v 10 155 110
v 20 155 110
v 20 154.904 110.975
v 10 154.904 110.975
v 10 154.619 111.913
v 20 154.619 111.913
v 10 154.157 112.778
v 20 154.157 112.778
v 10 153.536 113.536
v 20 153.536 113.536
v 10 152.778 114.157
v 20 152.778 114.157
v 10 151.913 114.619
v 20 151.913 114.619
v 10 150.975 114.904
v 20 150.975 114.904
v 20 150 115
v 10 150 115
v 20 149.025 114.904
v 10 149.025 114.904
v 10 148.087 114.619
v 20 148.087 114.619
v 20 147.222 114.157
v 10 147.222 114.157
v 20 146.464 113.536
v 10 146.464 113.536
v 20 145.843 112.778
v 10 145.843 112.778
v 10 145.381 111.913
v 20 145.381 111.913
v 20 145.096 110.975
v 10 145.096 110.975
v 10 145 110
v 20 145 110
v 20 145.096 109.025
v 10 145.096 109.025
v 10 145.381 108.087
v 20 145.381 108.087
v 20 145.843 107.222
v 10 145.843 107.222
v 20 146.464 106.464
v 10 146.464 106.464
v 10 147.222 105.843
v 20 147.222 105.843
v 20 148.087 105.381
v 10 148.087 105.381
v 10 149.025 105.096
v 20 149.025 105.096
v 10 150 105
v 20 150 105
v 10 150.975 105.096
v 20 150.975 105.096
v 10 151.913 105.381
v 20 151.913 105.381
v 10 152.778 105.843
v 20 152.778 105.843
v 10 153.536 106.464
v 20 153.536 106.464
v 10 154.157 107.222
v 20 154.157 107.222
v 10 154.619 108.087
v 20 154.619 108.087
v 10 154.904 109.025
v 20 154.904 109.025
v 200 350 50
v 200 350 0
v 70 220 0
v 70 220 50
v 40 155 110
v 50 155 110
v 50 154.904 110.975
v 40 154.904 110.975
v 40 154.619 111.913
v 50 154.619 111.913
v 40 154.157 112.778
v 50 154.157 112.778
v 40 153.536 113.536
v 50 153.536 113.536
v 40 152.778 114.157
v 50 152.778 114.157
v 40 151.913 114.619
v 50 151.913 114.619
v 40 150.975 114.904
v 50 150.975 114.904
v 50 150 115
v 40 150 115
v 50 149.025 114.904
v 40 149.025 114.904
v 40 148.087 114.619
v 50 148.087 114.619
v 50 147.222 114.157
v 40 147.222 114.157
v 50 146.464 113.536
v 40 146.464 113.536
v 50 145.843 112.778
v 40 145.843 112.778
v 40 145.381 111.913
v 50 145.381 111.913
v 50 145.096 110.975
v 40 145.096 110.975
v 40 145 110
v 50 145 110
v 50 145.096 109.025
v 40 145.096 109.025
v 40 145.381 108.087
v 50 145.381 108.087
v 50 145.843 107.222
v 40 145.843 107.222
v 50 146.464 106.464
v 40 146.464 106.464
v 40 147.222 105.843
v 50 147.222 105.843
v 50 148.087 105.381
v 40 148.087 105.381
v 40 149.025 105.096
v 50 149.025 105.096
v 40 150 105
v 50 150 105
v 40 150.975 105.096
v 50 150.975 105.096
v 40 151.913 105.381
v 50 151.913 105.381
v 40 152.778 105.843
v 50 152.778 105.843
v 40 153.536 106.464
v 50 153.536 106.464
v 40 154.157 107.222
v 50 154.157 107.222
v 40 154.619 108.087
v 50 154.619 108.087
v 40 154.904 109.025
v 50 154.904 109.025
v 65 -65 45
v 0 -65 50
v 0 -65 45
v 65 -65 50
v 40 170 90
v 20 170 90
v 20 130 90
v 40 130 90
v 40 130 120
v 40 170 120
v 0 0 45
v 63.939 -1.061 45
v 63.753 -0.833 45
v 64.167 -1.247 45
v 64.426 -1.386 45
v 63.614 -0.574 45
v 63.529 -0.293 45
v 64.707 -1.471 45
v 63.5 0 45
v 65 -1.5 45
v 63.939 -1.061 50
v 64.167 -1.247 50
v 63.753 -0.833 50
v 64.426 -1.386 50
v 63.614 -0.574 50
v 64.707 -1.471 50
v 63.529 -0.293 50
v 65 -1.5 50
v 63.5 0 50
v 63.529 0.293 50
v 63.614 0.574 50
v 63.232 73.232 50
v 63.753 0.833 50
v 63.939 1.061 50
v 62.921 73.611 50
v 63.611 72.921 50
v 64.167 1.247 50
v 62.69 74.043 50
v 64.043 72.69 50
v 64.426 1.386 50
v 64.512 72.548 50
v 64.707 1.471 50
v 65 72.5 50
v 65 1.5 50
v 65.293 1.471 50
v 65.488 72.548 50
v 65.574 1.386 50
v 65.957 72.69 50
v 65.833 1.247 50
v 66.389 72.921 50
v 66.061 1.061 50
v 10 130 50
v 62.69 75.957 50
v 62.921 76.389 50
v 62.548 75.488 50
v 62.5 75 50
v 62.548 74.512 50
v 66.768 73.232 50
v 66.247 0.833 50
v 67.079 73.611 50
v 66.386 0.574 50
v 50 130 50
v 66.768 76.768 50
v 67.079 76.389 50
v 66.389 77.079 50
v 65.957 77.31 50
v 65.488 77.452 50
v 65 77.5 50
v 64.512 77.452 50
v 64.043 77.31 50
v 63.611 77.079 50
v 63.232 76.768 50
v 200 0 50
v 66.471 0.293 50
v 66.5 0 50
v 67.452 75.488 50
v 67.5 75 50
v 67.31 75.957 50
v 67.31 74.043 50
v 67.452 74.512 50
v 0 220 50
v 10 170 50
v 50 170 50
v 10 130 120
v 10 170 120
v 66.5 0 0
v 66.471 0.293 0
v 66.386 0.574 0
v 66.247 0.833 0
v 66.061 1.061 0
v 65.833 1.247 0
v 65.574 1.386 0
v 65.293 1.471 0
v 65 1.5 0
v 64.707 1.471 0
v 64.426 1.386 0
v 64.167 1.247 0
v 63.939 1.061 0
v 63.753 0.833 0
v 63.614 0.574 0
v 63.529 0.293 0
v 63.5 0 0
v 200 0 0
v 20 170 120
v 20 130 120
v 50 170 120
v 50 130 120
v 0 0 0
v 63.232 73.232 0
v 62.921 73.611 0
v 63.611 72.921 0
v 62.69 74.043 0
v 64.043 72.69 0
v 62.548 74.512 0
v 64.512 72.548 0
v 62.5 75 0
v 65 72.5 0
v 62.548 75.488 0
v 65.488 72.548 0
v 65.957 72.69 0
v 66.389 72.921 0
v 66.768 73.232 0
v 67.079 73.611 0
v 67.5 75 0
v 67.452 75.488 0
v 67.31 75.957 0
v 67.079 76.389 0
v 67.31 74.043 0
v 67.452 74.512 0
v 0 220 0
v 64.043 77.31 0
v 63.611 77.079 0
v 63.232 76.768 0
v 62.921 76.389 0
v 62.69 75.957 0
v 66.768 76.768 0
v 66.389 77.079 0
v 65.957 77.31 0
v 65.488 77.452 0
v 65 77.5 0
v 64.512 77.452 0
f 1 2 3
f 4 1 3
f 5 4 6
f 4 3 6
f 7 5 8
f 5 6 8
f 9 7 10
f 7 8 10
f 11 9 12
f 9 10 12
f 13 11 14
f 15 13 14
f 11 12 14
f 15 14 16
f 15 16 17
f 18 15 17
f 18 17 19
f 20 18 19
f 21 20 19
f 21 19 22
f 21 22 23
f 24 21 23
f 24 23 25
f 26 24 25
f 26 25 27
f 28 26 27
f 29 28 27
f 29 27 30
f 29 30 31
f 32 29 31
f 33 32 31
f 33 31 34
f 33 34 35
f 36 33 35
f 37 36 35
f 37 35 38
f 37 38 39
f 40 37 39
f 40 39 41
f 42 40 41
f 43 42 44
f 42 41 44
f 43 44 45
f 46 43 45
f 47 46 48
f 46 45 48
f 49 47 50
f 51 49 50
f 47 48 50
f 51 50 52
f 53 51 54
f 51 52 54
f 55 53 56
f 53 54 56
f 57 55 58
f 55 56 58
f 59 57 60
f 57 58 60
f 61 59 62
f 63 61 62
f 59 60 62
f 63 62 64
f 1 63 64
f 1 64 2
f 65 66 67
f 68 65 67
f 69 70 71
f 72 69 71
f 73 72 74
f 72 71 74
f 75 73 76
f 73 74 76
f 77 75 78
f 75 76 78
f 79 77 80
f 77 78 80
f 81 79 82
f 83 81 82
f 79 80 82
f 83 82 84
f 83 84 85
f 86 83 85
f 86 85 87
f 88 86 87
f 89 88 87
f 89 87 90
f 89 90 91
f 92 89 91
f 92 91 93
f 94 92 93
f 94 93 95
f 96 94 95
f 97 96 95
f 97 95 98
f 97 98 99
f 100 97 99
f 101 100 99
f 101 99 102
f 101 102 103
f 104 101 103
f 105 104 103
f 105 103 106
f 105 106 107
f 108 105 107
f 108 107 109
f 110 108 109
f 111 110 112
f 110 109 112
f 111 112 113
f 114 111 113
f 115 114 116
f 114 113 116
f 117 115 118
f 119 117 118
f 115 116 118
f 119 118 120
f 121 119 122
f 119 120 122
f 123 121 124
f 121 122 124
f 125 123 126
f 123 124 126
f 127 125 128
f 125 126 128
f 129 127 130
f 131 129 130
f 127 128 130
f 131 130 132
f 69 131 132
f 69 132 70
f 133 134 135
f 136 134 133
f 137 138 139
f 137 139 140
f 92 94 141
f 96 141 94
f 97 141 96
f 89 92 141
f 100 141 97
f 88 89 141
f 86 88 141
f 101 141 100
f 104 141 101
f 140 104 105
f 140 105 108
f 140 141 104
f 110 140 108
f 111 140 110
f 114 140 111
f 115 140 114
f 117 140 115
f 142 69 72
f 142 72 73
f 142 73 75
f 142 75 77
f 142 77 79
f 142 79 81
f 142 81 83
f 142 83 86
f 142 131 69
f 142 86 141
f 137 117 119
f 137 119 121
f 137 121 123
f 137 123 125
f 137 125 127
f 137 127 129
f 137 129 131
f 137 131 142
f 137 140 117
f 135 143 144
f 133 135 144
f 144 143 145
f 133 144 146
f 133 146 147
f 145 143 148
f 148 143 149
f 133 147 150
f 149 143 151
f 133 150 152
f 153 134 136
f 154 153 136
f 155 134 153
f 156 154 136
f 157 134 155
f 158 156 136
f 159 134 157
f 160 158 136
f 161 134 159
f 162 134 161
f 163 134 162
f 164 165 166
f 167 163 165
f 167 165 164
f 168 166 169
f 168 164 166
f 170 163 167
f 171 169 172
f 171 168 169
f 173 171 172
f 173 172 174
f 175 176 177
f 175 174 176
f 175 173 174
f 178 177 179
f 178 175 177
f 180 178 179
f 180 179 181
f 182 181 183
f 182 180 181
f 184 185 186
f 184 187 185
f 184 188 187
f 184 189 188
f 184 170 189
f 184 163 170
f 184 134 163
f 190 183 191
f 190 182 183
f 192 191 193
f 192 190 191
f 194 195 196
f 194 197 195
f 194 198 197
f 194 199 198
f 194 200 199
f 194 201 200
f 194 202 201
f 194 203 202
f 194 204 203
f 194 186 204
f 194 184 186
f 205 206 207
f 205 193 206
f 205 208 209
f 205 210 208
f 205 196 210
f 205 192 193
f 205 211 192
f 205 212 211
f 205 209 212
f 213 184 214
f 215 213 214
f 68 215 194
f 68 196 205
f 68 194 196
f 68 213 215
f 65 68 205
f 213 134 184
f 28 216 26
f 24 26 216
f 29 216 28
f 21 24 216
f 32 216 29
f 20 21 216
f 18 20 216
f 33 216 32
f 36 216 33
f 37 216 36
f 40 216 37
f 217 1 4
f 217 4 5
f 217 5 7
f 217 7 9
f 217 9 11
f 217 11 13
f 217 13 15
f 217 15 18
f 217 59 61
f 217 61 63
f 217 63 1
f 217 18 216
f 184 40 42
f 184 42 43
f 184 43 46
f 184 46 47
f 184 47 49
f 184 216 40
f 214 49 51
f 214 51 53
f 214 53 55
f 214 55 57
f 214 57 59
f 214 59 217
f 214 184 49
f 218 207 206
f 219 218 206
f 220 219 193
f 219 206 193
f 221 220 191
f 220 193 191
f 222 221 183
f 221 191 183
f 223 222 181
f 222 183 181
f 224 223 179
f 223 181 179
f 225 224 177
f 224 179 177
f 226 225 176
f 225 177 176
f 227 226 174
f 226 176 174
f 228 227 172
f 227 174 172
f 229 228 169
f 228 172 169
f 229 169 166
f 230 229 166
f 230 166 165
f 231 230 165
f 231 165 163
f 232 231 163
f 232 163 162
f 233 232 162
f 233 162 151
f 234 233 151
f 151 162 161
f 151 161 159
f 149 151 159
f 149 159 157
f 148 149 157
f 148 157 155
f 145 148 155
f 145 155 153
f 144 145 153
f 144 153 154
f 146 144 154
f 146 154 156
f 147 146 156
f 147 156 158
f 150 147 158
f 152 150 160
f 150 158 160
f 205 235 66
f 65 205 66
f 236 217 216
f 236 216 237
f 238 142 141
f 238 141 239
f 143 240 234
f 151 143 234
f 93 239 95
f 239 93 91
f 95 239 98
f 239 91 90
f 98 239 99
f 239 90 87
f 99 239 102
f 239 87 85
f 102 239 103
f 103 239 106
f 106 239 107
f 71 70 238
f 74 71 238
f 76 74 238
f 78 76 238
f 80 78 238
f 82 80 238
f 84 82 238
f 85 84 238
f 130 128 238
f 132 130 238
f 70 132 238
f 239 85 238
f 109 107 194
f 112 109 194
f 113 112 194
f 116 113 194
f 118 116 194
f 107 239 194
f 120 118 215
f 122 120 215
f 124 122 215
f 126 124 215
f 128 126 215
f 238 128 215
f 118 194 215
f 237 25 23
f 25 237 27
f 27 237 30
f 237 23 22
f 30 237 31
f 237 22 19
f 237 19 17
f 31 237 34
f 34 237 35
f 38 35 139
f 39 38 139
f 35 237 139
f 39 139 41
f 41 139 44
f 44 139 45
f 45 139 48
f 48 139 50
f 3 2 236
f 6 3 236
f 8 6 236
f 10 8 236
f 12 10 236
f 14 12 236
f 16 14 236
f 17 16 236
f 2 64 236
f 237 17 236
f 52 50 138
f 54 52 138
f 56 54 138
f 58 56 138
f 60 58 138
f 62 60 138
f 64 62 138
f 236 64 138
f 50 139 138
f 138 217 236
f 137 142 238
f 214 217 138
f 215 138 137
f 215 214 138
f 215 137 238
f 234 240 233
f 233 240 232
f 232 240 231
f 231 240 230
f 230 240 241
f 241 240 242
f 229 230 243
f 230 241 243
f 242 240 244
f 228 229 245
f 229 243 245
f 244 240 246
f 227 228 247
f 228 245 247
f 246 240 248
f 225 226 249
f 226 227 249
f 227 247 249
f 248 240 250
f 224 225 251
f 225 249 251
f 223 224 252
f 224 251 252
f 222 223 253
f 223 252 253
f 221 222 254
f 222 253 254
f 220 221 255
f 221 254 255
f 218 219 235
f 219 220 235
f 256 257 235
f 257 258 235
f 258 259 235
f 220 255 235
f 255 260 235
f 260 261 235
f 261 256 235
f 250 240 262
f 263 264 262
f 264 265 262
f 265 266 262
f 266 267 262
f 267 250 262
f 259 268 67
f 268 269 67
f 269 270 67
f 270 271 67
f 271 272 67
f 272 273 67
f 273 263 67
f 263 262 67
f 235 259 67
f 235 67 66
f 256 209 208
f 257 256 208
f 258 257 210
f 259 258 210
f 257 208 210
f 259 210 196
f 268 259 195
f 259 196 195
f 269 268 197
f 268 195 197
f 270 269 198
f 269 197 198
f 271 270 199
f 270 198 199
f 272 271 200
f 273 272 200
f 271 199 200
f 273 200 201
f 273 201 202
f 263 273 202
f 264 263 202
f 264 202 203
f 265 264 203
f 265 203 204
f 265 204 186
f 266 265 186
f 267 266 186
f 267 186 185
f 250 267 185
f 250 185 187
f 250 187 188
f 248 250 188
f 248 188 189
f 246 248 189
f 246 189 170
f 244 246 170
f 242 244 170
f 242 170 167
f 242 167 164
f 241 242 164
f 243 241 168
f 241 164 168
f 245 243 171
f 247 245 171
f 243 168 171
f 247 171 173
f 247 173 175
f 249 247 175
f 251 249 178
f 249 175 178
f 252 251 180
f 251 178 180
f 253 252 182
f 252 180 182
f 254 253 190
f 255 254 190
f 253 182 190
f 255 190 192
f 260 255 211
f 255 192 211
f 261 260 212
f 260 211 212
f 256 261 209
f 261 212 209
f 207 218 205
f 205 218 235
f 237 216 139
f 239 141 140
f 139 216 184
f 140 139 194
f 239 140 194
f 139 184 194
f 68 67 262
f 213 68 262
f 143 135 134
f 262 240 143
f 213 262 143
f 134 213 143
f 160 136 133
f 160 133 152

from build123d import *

# Parameters (mm, degrees)
P_IDAT_VYSUNUT_M1_DEPTH  = 50
SKICA2_W                 = 130
SKICA2_H                 = 5
P_IDAT_VYSUNUT_M2_DEPTH  = 65
SKICA3_W                 = 65
SKICA3_H                 = 65
ODEBRAT_VYSUNUT_M1_DEPTH = 5
SKICA4_W                 = 40
SKICA4_H                 = 40
P_IDAT_VYSUNUT_M3_DEPTH  = 40
SKICA5_W                 = 10
SKICA5_H                 = 40
P_IDAT_VYSUNUT_M4_DEPTH  = 30
SKICA6_R                 = 5
ODEBRAT_VYSUNUT_M2_DEPTH = 40
SKICA7_R                 = 2.5
ODEBRAT_VYSUNUT_M3_DEPTH = 55
SKICA8_R                 = 1.5
ODEBRAT_VYSUNUT_M4_DEPTH = 50


with BuildPart() as part:
    # Skica1 → Přidat vysunutím1 (new body)
    with BuildSketch(Plane.XY):
        Polygon((0, 0), (200, 0), (200, 350), (70, 220), (0, 220), align=None)
    extrude(amount=P_IDAT_VYSUNUT_M1_DEPTH)

    # Skica2 → Přidat vysunutím2 (add)
    with BuildSketch(Plane.XZ):
        with Locations((65, 47.5)):
            Rectangle(SKICA2_W, SKICA2_H)
    extrude(amount=P_IDAT_VYSUNUT_M2_DEPTH)

    # Skica3 → Odebrat vysunutím1 (cut)
    with BuildSketch(Plane.XY.offset(50)):
        with Locations((97.5, -32.5)):
            Rectangle(SKICA3_W, SKICA3_H)
    extrude(amount=-ODEBRAT_VYSUNUT_M1_DEPTH, mode=Mode.SUBTRACT)

    # Skica4 → Přidat vysunutím3 (add)
    with BuildSketch(Plane.XY.offset(50)):
        with Locations((30, 150)):
            Rectangle(SKICA4_W, SKICA4_H)
    extrude(amount=P_IDAT_VYSUNUT_M3_DEPTH)

    # Skica5 → Přidat vysunutím4 (add)
    with BuildSketch(Plane.XY.offset(90)):
        with Locations((15, 150)):
            Rectangle(SKICA5_W, SKICA5_H)
        with Locations((45, 150)):
            Rectangle(SKICA5_W, SKICA5_H)
    extrude(amount=P_IDAT_VYSUNUT_M4_DEPTH)

    # Skica6 → Odebrat vysunutím2 (cut)
    with BuildSketch(Plane(origin=(50, 0, 0), x_dir=(0, 0, -1), z_dir=(1, 0, 0))):
        with Locations(Location((-110, 150, 0), (0, 0, 90))):
            Circle(SKICA6_R)
    extrude(amount=-ODEBRAT_VYSUNUT_M2_DEPTH, mode=Mode.SUBTRACT)

    # Skica7 → Odebrat vysunutím3 (cut)
    with BuildSketch(Plane.XY.offset(50)):
        with Locations((65, 75)):
            Circle(SKICA7_R)
    extrude(amount=-ODEBRAT_VYSUNUT_M3_DEPTH, mode=Mode.SUBTRACT)

    # Skica8 → Odebrat vysunutím4 (cut)
    with BuildSketch(Plane.XY.offset(50)):
        with Locations((65, 0)):
            Circle(SKICA8_R)
    extrude(amount=-ODEBRAT_VYSUNUT_M4_DEPTH, mode=Mode.SUBTRACT)


solid = part.part
